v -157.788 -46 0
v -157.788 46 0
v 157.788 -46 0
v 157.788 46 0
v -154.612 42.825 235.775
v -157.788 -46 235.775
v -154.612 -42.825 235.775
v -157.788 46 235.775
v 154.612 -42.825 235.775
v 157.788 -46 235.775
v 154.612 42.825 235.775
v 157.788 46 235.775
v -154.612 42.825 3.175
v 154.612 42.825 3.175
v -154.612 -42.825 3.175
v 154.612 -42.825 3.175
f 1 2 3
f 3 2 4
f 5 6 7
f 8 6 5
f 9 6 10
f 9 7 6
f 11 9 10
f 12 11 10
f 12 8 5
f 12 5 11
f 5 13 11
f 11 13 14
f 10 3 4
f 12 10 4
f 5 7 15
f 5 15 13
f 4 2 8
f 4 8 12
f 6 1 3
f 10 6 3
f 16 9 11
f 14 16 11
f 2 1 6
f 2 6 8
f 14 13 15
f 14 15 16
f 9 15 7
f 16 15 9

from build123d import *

# Parameters (mm, degrees)
SKETCH1_W           = 315.575
SKETCH1_H           = 92
SKETCH1_W_2         = 309.225
SKETCH1_H_2         = 85.65
BOSS_EXTRUDE1_DEPTH = 235.775
SKETCH1_2_W         = 309.225
SKETCH1_2_H         = 85.65
BOSS_EXTRUDE2_DEPTH = 3.175


with BuildPart() as part:
    # Sketch1 → Boss-Extrude1 (new body)
    with BuildSketch(Plane.XY):
        Rectangle(SKETCH1_W, SKETCH1_H)
        Rectangle(SKETCH1_W_2, SKETCH1_H_2, mode=Mode.SUBTRACT)
    extrude(amount=BOSS_EXTRUDE1_DEPTH)

    # Sketch1<2> → Boss-Extrude2 (add)
    with BuildSketch(Plane.XY):
        Rectangle(SKETCH1_2_W, SKETCH1_2_H)
    extrude(amount=BOSS_EXTRUDE2_DEPTH)


solid = part.part
